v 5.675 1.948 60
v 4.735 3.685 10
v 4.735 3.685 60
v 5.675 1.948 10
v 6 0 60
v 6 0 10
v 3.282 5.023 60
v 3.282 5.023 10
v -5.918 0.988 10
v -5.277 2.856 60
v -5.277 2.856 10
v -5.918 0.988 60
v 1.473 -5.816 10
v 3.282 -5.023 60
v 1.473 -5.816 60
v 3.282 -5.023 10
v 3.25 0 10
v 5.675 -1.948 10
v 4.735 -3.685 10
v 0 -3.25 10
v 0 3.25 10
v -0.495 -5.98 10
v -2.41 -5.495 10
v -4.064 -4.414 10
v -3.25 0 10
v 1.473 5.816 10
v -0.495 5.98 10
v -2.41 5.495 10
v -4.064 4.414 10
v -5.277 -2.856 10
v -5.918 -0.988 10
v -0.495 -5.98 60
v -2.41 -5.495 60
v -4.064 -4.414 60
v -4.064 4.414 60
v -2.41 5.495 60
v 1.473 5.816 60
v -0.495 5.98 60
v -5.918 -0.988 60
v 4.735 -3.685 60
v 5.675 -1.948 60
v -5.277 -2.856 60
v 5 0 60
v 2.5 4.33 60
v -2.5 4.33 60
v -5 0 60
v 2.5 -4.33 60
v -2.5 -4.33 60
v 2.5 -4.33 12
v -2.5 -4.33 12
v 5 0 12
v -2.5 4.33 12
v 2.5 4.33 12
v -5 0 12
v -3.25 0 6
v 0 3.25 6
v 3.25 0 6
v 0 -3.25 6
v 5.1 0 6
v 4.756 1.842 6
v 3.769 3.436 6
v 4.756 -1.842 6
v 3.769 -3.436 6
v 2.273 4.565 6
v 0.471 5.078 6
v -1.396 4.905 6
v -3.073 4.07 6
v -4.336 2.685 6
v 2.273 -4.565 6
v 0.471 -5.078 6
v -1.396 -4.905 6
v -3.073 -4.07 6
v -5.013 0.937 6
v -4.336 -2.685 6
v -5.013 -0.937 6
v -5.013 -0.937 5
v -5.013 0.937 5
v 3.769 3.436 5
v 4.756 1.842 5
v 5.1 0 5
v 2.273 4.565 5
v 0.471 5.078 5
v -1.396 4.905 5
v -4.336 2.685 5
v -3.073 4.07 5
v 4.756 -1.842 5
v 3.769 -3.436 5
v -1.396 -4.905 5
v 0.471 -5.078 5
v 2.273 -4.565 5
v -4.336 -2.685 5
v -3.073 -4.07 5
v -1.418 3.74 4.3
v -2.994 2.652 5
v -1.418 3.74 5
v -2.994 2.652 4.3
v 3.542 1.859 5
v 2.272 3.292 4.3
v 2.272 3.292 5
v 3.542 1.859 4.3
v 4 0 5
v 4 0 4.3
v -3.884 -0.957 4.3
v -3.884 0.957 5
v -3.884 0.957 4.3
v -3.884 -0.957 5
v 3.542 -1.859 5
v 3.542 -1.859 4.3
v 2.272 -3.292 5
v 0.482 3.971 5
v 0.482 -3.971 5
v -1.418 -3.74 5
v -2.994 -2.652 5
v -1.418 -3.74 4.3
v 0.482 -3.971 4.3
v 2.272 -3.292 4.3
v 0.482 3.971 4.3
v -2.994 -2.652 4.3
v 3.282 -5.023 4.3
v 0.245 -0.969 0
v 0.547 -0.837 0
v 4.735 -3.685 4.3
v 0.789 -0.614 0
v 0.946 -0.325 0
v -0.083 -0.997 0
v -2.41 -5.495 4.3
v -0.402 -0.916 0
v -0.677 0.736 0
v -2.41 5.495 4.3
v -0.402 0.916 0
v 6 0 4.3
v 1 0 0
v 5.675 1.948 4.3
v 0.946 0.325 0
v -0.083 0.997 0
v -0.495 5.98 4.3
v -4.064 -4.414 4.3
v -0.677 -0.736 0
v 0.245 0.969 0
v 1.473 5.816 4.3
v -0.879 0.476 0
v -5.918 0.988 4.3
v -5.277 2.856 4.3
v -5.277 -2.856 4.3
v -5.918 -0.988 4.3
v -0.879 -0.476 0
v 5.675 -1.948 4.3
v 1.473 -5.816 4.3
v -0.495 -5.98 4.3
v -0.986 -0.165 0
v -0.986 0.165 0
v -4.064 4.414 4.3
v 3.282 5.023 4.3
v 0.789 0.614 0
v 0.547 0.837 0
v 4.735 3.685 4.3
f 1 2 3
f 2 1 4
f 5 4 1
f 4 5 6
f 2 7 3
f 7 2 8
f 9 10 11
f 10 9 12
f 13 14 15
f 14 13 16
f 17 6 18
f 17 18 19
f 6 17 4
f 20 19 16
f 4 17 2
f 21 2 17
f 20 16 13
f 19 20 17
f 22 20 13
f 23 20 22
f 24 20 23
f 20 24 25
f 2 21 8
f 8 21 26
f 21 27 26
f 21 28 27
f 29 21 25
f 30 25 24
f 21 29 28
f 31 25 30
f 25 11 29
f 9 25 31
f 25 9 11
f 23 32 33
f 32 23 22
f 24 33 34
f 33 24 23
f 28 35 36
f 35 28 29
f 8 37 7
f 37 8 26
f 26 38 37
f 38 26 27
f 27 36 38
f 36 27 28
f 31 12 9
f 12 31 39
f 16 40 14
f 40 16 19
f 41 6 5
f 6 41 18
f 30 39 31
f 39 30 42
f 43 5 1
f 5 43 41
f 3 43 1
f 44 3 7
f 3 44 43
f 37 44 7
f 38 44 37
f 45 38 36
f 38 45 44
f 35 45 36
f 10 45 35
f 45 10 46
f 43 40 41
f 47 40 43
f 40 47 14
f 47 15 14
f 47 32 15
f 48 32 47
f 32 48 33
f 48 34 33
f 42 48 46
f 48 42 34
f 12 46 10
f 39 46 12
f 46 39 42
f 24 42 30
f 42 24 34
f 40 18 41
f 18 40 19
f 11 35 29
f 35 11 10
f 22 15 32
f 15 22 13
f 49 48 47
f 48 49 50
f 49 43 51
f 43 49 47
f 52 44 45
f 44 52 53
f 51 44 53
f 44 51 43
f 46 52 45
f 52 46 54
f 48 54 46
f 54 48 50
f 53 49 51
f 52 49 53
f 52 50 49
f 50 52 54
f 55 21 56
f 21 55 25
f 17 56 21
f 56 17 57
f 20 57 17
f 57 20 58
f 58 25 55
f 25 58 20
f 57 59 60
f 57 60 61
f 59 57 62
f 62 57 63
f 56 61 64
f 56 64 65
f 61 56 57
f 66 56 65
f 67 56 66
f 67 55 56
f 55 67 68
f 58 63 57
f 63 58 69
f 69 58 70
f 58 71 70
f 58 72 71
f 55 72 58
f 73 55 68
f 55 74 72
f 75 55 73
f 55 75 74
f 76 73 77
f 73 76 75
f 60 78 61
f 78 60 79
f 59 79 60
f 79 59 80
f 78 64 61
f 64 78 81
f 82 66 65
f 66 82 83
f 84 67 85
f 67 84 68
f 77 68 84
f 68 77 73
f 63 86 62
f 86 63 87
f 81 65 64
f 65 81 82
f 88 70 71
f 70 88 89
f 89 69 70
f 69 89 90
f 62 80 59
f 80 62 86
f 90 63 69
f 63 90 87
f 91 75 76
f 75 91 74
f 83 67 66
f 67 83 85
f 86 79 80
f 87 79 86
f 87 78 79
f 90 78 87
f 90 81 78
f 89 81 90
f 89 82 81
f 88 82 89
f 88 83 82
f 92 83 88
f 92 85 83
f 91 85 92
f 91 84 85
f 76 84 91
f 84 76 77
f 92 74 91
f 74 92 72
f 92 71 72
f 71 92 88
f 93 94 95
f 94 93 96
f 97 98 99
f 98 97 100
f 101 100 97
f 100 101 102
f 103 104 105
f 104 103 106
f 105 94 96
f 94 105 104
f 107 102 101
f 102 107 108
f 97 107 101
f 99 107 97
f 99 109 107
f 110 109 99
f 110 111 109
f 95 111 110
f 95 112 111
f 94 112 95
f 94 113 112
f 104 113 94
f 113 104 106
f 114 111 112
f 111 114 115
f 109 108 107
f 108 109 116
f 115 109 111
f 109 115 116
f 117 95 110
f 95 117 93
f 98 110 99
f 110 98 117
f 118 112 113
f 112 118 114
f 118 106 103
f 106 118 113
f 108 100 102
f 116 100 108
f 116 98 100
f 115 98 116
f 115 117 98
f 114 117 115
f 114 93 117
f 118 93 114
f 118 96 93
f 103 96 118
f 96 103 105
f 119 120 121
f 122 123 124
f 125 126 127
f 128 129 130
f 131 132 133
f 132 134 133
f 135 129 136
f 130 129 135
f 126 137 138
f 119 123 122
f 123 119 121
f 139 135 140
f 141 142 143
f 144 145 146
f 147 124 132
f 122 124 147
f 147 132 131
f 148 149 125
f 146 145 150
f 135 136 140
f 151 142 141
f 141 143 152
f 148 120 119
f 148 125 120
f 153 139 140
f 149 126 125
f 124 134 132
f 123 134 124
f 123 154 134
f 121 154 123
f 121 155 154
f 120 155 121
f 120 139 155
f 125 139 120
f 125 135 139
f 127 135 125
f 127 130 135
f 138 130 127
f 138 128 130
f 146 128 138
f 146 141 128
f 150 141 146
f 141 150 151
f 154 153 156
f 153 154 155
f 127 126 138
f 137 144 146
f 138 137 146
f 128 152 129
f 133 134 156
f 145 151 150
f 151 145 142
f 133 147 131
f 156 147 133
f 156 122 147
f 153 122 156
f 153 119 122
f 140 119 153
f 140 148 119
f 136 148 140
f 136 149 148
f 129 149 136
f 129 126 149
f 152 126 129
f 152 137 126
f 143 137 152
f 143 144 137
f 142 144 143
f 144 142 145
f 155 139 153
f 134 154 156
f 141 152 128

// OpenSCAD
//
// My first OpenSCAD project: trying to model something that'd fit the
// bit holder of the (toy) Ixolito electric screwdriver.
//
// Created March 2018 by Emil Brink <emil@obsession.se>.
//

// Don't change this, it should be the proper shape to fit the tool.
coneHeight = 4.3;
thinHeight = 0.7;
thickHeight = 1.0;
squareHeight = 4.0;

module hexSocket(radius = 5, wt = 1, h = 50, depth = 2) {
    old_fn = $fn;
    difference() {
        cylinder(h, r1 = radius  + wt, r2 = radius + wt, $fn = old_fn);
        translate([0, 0, depth]) {
          cylinder(h - depth, r1 = radius, r2 = radius, $fn = 6);
        }
    }
    $fn = 6;
}

module squareShaft(r = 10, h = 50) {
    old_fn = $fn;
    cylinder(h, r1 = r, r2 = r, $fn = 4);
    $fn = old_fn;
}

cylinder(h = coneHeight, r1 = 1, r2 = 6);
translate([0, 0, coneHeight]) {
    cylinder(h = thinHeight, r1 = 4, r2 = 4);
    translate([0, 0, thinHeight]) {
        cylinder(h = thickHeight, r1 = 5.1, r2 = 5.1);
        translate([0, 0, thickHeight]) {
            squareShaft(r = 3.25, h = squareHeight);
            translate([0, 0, squareHeight]) {
                hexSocket();
            }
        }
    }
}
